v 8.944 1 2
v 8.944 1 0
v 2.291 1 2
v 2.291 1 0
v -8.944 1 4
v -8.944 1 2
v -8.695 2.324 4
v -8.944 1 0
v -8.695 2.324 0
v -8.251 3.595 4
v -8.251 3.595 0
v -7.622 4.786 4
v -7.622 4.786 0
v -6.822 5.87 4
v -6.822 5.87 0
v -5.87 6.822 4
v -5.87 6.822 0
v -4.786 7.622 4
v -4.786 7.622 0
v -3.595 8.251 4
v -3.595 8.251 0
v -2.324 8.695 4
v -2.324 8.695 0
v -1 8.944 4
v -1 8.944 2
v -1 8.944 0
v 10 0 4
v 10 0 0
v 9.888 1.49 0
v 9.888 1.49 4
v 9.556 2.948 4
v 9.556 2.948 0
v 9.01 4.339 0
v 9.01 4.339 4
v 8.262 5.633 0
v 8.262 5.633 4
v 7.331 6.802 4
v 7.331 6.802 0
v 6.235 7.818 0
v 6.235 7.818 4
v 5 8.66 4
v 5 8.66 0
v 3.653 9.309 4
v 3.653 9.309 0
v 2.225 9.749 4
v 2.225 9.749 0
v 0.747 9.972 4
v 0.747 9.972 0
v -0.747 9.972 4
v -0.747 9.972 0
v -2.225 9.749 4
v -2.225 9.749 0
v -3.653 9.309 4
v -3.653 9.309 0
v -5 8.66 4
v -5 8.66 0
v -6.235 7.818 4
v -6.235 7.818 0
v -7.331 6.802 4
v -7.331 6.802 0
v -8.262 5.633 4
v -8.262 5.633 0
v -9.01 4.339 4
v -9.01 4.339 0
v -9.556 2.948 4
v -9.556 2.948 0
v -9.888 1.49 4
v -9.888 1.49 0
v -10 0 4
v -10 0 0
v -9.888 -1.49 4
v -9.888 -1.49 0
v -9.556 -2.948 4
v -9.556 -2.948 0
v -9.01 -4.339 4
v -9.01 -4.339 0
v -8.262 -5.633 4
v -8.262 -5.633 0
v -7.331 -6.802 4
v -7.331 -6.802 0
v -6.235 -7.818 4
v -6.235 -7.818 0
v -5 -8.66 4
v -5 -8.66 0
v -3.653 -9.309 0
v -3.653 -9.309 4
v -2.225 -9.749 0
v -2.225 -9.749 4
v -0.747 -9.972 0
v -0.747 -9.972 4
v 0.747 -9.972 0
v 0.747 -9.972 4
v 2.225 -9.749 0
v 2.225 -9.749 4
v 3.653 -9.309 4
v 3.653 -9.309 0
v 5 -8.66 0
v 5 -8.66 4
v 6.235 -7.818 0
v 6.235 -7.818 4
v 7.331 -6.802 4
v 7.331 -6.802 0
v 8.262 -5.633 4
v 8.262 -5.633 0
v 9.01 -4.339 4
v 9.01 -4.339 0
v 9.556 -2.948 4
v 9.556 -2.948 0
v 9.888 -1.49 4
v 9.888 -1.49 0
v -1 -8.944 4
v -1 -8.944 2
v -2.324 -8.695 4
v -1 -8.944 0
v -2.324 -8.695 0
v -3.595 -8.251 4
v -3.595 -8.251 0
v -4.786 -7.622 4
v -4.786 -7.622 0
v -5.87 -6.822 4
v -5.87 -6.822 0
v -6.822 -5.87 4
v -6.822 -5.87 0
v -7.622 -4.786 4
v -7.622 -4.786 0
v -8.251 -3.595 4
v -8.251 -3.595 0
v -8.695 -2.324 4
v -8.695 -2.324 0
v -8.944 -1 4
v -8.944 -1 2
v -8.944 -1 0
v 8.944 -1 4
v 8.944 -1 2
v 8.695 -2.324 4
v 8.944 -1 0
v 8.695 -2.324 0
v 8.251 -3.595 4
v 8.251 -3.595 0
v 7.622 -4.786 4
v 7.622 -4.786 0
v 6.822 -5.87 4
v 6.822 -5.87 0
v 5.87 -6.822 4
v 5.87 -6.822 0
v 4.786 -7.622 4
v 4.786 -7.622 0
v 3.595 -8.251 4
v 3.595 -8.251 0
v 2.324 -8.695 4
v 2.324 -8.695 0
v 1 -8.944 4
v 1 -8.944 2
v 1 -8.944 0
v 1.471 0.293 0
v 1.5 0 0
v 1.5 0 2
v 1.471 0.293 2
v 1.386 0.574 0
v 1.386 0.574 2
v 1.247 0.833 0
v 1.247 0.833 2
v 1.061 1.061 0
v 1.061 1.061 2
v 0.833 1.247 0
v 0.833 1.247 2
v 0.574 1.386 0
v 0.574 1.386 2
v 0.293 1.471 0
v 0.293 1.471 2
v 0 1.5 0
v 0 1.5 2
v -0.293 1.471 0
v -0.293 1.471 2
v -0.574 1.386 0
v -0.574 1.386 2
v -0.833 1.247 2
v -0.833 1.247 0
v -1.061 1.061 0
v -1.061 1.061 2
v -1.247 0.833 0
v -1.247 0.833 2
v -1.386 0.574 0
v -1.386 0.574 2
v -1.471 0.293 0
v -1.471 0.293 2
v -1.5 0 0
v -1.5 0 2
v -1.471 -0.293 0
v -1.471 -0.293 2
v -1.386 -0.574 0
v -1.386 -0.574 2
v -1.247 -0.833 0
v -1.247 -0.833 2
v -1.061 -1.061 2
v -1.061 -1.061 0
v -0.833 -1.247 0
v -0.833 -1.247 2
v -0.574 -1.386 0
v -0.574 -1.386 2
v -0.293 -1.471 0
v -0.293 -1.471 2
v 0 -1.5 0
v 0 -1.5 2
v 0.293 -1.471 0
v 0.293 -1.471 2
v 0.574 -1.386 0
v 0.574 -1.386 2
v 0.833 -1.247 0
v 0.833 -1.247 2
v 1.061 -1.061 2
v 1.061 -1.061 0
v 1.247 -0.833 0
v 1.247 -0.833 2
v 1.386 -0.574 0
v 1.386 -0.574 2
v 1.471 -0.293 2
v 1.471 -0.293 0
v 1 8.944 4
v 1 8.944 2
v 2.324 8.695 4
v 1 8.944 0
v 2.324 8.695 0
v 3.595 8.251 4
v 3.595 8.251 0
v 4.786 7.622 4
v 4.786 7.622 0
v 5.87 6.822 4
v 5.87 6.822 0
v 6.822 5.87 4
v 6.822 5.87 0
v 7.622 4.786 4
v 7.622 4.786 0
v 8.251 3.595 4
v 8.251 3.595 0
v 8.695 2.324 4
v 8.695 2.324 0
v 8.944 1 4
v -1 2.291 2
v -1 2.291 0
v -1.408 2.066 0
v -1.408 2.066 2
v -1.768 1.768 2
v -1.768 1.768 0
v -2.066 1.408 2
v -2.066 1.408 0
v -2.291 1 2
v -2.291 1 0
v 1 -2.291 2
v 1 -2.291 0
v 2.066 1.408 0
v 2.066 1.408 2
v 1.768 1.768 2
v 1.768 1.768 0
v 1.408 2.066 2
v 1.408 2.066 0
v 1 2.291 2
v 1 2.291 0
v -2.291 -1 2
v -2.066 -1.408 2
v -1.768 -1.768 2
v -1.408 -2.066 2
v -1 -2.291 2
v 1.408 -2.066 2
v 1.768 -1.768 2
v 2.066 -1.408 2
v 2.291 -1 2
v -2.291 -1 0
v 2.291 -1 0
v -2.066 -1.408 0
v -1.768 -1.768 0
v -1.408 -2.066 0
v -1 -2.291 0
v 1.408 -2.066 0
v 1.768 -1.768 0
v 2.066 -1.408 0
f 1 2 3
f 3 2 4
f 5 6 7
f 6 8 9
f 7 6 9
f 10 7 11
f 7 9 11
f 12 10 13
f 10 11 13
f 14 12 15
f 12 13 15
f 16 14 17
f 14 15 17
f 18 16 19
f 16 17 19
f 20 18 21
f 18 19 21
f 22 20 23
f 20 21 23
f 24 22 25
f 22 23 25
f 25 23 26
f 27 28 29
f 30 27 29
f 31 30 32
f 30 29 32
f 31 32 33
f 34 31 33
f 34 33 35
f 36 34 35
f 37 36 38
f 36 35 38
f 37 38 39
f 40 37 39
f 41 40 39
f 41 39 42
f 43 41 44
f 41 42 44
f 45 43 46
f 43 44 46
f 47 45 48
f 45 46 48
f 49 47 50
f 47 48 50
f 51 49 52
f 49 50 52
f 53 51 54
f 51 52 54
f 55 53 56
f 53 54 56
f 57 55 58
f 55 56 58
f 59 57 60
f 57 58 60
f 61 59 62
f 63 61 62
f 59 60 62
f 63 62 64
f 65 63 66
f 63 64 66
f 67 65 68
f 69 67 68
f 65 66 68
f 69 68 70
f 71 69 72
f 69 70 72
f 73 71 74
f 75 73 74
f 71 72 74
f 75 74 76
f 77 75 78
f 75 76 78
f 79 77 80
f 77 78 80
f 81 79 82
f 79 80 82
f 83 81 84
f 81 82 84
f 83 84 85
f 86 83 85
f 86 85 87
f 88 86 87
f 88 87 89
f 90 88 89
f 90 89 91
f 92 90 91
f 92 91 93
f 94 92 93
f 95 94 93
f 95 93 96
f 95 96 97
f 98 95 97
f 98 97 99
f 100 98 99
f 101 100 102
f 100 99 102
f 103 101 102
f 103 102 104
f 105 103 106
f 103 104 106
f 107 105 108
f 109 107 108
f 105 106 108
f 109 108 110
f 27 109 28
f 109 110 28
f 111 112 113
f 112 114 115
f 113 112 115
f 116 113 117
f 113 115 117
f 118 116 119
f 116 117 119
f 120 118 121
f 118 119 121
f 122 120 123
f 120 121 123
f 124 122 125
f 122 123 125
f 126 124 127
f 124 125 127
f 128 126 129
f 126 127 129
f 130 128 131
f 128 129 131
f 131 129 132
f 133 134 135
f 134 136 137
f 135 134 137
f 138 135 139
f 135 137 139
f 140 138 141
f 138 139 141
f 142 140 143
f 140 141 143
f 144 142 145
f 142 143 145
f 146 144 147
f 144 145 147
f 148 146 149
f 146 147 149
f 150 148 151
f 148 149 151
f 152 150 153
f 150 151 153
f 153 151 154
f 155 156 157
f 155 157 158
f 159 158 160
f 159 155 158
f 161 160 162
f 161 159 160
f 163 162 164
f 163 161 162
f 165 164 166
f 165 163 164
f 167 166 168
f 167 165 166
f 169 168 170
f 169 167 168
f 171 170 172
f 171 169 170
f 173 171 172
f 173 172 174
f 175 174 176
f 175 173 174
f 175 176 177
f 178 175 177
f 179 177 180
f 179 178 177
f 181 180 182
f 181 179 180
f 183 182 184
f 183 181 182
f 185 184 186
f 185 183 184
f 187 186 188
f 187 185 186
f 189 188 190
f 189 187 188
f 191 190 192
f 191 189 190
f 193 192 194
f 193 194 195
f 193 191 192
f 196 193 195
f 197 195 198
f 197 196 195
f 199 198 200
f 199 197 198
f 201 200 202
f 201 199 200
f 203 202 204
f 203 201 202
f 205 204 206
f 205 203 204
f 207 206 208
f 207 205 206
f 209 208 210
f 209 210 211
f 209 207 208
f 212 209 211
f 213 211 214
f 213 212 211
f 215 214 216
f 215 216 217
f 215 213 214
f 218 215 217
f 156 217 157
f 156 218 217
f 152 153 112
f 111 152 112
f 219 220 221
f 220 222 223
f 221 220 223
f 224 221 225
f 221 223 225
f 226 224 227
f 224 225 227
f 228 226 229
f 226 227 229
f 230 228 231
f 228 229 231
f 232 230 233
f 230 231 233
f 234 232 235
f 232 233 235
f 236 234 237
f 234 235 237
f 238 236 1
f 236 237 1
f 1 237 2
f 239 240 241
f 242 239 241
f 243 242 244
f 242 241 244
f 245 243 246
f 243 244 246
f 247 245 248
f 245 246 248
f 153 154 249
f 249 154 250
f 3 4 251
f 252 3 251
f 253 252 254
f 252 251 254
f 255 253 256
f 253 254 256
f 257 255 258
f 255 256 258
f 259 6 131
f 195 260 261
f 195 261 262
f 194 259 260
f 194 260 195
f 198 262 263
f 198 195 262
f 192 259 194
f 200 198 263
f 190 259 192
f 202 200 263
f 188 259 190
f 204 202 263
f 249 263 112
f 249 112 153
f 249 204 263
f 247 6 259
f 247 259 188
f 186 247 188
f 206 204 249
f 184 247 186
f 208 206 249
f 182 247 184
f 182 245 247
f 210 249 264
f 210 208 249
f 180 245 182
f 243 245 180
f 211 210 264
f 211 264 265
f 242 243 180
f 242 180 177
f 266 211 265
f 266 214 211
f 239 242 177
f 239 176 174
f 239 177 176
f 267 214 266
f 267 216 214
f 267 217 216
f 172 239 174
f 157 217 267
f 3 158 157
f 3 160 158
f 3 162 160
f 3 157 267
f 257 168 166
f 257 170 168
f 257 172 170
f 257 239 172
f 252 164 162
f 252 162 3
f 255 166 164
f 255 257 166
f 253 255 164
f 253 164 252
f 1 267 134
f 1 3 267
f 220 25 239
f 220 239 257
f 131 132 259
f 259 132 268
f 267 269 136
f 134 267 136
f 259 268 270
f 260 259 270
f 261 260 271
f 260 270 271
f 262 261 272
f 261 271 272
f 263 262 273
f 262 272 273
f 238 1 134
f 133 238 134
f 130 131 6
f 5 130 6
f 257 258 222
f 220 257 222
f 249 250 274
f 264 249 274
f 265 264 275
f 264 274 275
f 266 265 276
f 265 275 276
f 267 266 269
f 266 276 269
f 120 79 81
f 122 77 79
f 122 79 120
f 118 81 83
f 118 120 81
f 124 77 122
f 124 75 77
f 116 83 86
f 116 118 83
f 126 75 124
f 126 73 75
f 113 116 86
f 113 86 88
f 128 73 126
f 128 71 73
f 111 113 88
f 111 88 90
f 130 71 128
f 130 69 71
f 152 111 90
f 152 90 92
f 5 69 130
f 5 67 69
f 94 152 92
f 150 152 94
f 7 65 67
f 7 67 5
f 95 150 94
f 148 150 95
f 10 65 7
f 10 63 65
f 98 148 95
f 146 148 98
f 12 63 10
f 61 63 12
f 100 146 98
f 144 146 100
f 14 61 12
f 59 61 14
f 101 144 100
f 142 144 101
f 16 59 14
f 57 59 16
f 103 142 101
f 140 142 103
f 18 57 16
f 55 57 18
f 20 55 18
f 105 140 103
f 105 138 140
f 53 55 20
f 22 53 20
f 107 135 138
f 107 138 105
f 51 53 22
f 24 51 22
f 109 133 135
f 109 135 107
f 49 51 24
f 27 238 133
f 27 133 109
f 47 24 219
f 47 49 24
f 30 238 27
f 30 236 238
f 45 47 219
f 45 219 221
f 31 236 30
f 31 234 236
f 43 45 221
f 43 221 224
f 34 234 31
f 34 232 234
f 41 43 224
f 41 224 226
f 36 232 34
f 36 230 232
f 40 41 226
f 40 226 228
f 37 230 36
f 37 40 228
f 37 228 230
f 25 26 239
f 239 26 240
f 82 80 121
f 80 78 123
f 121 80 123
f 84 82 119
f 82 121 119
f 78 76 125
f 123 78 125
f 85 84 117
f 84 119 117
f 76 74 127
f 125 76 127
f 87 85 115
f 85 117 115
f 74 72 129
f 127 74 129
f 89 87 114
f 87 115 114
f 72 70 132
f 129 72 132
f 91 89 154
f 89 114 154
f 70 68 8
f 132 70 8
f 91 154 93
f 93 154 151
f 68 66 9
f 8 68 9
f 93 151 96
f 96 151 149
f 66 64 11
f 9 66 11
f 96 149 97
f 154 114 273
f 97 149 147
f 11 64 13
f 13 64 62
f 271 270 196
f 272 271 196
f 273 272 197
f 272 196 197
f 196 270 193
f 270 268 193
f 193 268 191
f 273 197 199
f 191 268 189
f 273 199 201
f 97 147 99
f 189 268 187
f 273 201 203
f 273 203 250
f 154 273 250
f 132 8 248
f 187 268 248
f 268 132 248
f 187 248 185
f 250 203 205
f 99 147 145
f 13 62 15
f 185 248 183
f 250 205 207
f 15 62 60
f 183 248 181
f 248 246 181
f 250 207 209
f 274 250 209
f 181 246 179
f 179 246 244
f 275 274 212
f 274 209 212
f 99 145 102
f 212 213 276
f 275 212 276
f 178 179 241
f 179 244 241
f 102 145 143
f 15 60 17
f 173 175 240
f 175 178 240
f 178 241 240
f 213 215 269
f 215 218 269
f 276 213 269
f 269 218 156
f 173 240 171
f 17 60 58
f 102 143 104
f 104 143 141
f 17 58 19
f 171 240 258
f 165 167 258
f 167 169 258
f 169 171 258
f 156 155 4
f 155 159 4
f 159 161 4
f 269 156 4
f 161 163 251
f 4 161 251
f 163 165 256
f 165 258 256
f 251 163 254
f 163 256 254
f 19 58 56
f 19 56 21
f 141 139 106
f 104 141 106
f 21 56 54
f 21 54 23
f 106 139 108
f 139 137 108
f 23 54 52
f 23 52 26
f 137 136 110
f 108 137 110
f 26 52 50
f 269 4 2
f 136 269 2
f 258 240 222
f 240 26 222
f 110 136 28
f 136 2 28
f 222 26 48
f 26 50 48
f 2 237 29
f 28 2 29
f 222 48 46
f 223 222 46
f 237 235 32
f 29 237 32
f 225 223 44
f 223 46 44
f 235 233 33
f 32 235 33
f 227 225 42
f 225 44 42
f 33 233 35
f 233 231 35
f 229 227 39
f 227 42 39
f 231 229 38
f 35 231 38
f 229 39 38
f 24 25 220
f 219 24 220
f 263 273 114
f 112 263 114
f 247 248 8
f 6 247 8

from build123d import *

# Parameters (mm, degrees)
F0_R     = 1.5
F1_DEPTH = 2
F0_R_2   = 10
F2_DEPTH = 4


with BuildPart() as f1:
    # F0 (on Top) → F1 (new body)
    with BuildSketch(Plane.XY):
        with BuildLine():
            Line((-8.944272, 1), (-8.944272, -1))
            Line((-8.944272, -1), (-2.291288, -1))
            ThreePointArc((-2.291288, -1), (-1.767767, -1.767767), (-1, -2.291288))
            Line((-1, -2.291288), (-1, -8.944272))
            Line((-1, -8.944272), (1, -8.944272))
            Line((1, -8.944272), (1, -2.291288))
            ThreePointArc((1, -2.291288), (1.767767, -1.767767), (2.291288, -1))
            Line((2.291288, -1), (8.944272, -1))
            Line((8.944272, -1), (8.944272, 1))
            Line((8.944272, 1), (2.291288, 1))
            ThreePointArc((2.291288, 1), (1.767767, 1.767767), (1, 2.291288))
            Line((1, 2.291288), (1, 8.944272))
            Line((1, 8.944272), (-1, 8.944272))
            Line((-1, 8.944272), (-1, 2.291288))
            ThreePointArc((-1, 2.291288), (-1.767767, 1.767767), (-2.291288, 1))
            Line((-2.291288, 1), (-8.944272, 1))
        make_face()
        Circle(F0_R, mode=Mode.SUBTRACT)
    extrude(amount=F1_DEPTH)

    # F0 (on Top) → F2 (join)
    with BuildSketch(Plane.XY):
        Circle(F0_R_2)
        with BuildLine():
            ThreePointArc((-1, -8.944272), (-6.363961, -6.363961), (-8.944272, -1))
            Line((-8.944272, -1), (-8.944272, 1))
            ThreePointArc((-8.944272, 1), (-6.363961, 6.363961), (-1, 8.944272))
            Line((-1, 8.944272), (1, 8.944272))
            ThreePointArc((1, 8.944272), (6.363961, 6.363961), (8.944272, 1))
            Line((8.944272, 1), (8.944272, -1))
            ThreePointArc((8.944272, -1), (6.363961, -6.363961), (1, -8.944272))
            Line((1, -8.944272), (-1, -8.944272))
        make_face(mode=Mode.SUBTRACT)
    extrude(amount=F2_DEPTH)


solid = f1.part
